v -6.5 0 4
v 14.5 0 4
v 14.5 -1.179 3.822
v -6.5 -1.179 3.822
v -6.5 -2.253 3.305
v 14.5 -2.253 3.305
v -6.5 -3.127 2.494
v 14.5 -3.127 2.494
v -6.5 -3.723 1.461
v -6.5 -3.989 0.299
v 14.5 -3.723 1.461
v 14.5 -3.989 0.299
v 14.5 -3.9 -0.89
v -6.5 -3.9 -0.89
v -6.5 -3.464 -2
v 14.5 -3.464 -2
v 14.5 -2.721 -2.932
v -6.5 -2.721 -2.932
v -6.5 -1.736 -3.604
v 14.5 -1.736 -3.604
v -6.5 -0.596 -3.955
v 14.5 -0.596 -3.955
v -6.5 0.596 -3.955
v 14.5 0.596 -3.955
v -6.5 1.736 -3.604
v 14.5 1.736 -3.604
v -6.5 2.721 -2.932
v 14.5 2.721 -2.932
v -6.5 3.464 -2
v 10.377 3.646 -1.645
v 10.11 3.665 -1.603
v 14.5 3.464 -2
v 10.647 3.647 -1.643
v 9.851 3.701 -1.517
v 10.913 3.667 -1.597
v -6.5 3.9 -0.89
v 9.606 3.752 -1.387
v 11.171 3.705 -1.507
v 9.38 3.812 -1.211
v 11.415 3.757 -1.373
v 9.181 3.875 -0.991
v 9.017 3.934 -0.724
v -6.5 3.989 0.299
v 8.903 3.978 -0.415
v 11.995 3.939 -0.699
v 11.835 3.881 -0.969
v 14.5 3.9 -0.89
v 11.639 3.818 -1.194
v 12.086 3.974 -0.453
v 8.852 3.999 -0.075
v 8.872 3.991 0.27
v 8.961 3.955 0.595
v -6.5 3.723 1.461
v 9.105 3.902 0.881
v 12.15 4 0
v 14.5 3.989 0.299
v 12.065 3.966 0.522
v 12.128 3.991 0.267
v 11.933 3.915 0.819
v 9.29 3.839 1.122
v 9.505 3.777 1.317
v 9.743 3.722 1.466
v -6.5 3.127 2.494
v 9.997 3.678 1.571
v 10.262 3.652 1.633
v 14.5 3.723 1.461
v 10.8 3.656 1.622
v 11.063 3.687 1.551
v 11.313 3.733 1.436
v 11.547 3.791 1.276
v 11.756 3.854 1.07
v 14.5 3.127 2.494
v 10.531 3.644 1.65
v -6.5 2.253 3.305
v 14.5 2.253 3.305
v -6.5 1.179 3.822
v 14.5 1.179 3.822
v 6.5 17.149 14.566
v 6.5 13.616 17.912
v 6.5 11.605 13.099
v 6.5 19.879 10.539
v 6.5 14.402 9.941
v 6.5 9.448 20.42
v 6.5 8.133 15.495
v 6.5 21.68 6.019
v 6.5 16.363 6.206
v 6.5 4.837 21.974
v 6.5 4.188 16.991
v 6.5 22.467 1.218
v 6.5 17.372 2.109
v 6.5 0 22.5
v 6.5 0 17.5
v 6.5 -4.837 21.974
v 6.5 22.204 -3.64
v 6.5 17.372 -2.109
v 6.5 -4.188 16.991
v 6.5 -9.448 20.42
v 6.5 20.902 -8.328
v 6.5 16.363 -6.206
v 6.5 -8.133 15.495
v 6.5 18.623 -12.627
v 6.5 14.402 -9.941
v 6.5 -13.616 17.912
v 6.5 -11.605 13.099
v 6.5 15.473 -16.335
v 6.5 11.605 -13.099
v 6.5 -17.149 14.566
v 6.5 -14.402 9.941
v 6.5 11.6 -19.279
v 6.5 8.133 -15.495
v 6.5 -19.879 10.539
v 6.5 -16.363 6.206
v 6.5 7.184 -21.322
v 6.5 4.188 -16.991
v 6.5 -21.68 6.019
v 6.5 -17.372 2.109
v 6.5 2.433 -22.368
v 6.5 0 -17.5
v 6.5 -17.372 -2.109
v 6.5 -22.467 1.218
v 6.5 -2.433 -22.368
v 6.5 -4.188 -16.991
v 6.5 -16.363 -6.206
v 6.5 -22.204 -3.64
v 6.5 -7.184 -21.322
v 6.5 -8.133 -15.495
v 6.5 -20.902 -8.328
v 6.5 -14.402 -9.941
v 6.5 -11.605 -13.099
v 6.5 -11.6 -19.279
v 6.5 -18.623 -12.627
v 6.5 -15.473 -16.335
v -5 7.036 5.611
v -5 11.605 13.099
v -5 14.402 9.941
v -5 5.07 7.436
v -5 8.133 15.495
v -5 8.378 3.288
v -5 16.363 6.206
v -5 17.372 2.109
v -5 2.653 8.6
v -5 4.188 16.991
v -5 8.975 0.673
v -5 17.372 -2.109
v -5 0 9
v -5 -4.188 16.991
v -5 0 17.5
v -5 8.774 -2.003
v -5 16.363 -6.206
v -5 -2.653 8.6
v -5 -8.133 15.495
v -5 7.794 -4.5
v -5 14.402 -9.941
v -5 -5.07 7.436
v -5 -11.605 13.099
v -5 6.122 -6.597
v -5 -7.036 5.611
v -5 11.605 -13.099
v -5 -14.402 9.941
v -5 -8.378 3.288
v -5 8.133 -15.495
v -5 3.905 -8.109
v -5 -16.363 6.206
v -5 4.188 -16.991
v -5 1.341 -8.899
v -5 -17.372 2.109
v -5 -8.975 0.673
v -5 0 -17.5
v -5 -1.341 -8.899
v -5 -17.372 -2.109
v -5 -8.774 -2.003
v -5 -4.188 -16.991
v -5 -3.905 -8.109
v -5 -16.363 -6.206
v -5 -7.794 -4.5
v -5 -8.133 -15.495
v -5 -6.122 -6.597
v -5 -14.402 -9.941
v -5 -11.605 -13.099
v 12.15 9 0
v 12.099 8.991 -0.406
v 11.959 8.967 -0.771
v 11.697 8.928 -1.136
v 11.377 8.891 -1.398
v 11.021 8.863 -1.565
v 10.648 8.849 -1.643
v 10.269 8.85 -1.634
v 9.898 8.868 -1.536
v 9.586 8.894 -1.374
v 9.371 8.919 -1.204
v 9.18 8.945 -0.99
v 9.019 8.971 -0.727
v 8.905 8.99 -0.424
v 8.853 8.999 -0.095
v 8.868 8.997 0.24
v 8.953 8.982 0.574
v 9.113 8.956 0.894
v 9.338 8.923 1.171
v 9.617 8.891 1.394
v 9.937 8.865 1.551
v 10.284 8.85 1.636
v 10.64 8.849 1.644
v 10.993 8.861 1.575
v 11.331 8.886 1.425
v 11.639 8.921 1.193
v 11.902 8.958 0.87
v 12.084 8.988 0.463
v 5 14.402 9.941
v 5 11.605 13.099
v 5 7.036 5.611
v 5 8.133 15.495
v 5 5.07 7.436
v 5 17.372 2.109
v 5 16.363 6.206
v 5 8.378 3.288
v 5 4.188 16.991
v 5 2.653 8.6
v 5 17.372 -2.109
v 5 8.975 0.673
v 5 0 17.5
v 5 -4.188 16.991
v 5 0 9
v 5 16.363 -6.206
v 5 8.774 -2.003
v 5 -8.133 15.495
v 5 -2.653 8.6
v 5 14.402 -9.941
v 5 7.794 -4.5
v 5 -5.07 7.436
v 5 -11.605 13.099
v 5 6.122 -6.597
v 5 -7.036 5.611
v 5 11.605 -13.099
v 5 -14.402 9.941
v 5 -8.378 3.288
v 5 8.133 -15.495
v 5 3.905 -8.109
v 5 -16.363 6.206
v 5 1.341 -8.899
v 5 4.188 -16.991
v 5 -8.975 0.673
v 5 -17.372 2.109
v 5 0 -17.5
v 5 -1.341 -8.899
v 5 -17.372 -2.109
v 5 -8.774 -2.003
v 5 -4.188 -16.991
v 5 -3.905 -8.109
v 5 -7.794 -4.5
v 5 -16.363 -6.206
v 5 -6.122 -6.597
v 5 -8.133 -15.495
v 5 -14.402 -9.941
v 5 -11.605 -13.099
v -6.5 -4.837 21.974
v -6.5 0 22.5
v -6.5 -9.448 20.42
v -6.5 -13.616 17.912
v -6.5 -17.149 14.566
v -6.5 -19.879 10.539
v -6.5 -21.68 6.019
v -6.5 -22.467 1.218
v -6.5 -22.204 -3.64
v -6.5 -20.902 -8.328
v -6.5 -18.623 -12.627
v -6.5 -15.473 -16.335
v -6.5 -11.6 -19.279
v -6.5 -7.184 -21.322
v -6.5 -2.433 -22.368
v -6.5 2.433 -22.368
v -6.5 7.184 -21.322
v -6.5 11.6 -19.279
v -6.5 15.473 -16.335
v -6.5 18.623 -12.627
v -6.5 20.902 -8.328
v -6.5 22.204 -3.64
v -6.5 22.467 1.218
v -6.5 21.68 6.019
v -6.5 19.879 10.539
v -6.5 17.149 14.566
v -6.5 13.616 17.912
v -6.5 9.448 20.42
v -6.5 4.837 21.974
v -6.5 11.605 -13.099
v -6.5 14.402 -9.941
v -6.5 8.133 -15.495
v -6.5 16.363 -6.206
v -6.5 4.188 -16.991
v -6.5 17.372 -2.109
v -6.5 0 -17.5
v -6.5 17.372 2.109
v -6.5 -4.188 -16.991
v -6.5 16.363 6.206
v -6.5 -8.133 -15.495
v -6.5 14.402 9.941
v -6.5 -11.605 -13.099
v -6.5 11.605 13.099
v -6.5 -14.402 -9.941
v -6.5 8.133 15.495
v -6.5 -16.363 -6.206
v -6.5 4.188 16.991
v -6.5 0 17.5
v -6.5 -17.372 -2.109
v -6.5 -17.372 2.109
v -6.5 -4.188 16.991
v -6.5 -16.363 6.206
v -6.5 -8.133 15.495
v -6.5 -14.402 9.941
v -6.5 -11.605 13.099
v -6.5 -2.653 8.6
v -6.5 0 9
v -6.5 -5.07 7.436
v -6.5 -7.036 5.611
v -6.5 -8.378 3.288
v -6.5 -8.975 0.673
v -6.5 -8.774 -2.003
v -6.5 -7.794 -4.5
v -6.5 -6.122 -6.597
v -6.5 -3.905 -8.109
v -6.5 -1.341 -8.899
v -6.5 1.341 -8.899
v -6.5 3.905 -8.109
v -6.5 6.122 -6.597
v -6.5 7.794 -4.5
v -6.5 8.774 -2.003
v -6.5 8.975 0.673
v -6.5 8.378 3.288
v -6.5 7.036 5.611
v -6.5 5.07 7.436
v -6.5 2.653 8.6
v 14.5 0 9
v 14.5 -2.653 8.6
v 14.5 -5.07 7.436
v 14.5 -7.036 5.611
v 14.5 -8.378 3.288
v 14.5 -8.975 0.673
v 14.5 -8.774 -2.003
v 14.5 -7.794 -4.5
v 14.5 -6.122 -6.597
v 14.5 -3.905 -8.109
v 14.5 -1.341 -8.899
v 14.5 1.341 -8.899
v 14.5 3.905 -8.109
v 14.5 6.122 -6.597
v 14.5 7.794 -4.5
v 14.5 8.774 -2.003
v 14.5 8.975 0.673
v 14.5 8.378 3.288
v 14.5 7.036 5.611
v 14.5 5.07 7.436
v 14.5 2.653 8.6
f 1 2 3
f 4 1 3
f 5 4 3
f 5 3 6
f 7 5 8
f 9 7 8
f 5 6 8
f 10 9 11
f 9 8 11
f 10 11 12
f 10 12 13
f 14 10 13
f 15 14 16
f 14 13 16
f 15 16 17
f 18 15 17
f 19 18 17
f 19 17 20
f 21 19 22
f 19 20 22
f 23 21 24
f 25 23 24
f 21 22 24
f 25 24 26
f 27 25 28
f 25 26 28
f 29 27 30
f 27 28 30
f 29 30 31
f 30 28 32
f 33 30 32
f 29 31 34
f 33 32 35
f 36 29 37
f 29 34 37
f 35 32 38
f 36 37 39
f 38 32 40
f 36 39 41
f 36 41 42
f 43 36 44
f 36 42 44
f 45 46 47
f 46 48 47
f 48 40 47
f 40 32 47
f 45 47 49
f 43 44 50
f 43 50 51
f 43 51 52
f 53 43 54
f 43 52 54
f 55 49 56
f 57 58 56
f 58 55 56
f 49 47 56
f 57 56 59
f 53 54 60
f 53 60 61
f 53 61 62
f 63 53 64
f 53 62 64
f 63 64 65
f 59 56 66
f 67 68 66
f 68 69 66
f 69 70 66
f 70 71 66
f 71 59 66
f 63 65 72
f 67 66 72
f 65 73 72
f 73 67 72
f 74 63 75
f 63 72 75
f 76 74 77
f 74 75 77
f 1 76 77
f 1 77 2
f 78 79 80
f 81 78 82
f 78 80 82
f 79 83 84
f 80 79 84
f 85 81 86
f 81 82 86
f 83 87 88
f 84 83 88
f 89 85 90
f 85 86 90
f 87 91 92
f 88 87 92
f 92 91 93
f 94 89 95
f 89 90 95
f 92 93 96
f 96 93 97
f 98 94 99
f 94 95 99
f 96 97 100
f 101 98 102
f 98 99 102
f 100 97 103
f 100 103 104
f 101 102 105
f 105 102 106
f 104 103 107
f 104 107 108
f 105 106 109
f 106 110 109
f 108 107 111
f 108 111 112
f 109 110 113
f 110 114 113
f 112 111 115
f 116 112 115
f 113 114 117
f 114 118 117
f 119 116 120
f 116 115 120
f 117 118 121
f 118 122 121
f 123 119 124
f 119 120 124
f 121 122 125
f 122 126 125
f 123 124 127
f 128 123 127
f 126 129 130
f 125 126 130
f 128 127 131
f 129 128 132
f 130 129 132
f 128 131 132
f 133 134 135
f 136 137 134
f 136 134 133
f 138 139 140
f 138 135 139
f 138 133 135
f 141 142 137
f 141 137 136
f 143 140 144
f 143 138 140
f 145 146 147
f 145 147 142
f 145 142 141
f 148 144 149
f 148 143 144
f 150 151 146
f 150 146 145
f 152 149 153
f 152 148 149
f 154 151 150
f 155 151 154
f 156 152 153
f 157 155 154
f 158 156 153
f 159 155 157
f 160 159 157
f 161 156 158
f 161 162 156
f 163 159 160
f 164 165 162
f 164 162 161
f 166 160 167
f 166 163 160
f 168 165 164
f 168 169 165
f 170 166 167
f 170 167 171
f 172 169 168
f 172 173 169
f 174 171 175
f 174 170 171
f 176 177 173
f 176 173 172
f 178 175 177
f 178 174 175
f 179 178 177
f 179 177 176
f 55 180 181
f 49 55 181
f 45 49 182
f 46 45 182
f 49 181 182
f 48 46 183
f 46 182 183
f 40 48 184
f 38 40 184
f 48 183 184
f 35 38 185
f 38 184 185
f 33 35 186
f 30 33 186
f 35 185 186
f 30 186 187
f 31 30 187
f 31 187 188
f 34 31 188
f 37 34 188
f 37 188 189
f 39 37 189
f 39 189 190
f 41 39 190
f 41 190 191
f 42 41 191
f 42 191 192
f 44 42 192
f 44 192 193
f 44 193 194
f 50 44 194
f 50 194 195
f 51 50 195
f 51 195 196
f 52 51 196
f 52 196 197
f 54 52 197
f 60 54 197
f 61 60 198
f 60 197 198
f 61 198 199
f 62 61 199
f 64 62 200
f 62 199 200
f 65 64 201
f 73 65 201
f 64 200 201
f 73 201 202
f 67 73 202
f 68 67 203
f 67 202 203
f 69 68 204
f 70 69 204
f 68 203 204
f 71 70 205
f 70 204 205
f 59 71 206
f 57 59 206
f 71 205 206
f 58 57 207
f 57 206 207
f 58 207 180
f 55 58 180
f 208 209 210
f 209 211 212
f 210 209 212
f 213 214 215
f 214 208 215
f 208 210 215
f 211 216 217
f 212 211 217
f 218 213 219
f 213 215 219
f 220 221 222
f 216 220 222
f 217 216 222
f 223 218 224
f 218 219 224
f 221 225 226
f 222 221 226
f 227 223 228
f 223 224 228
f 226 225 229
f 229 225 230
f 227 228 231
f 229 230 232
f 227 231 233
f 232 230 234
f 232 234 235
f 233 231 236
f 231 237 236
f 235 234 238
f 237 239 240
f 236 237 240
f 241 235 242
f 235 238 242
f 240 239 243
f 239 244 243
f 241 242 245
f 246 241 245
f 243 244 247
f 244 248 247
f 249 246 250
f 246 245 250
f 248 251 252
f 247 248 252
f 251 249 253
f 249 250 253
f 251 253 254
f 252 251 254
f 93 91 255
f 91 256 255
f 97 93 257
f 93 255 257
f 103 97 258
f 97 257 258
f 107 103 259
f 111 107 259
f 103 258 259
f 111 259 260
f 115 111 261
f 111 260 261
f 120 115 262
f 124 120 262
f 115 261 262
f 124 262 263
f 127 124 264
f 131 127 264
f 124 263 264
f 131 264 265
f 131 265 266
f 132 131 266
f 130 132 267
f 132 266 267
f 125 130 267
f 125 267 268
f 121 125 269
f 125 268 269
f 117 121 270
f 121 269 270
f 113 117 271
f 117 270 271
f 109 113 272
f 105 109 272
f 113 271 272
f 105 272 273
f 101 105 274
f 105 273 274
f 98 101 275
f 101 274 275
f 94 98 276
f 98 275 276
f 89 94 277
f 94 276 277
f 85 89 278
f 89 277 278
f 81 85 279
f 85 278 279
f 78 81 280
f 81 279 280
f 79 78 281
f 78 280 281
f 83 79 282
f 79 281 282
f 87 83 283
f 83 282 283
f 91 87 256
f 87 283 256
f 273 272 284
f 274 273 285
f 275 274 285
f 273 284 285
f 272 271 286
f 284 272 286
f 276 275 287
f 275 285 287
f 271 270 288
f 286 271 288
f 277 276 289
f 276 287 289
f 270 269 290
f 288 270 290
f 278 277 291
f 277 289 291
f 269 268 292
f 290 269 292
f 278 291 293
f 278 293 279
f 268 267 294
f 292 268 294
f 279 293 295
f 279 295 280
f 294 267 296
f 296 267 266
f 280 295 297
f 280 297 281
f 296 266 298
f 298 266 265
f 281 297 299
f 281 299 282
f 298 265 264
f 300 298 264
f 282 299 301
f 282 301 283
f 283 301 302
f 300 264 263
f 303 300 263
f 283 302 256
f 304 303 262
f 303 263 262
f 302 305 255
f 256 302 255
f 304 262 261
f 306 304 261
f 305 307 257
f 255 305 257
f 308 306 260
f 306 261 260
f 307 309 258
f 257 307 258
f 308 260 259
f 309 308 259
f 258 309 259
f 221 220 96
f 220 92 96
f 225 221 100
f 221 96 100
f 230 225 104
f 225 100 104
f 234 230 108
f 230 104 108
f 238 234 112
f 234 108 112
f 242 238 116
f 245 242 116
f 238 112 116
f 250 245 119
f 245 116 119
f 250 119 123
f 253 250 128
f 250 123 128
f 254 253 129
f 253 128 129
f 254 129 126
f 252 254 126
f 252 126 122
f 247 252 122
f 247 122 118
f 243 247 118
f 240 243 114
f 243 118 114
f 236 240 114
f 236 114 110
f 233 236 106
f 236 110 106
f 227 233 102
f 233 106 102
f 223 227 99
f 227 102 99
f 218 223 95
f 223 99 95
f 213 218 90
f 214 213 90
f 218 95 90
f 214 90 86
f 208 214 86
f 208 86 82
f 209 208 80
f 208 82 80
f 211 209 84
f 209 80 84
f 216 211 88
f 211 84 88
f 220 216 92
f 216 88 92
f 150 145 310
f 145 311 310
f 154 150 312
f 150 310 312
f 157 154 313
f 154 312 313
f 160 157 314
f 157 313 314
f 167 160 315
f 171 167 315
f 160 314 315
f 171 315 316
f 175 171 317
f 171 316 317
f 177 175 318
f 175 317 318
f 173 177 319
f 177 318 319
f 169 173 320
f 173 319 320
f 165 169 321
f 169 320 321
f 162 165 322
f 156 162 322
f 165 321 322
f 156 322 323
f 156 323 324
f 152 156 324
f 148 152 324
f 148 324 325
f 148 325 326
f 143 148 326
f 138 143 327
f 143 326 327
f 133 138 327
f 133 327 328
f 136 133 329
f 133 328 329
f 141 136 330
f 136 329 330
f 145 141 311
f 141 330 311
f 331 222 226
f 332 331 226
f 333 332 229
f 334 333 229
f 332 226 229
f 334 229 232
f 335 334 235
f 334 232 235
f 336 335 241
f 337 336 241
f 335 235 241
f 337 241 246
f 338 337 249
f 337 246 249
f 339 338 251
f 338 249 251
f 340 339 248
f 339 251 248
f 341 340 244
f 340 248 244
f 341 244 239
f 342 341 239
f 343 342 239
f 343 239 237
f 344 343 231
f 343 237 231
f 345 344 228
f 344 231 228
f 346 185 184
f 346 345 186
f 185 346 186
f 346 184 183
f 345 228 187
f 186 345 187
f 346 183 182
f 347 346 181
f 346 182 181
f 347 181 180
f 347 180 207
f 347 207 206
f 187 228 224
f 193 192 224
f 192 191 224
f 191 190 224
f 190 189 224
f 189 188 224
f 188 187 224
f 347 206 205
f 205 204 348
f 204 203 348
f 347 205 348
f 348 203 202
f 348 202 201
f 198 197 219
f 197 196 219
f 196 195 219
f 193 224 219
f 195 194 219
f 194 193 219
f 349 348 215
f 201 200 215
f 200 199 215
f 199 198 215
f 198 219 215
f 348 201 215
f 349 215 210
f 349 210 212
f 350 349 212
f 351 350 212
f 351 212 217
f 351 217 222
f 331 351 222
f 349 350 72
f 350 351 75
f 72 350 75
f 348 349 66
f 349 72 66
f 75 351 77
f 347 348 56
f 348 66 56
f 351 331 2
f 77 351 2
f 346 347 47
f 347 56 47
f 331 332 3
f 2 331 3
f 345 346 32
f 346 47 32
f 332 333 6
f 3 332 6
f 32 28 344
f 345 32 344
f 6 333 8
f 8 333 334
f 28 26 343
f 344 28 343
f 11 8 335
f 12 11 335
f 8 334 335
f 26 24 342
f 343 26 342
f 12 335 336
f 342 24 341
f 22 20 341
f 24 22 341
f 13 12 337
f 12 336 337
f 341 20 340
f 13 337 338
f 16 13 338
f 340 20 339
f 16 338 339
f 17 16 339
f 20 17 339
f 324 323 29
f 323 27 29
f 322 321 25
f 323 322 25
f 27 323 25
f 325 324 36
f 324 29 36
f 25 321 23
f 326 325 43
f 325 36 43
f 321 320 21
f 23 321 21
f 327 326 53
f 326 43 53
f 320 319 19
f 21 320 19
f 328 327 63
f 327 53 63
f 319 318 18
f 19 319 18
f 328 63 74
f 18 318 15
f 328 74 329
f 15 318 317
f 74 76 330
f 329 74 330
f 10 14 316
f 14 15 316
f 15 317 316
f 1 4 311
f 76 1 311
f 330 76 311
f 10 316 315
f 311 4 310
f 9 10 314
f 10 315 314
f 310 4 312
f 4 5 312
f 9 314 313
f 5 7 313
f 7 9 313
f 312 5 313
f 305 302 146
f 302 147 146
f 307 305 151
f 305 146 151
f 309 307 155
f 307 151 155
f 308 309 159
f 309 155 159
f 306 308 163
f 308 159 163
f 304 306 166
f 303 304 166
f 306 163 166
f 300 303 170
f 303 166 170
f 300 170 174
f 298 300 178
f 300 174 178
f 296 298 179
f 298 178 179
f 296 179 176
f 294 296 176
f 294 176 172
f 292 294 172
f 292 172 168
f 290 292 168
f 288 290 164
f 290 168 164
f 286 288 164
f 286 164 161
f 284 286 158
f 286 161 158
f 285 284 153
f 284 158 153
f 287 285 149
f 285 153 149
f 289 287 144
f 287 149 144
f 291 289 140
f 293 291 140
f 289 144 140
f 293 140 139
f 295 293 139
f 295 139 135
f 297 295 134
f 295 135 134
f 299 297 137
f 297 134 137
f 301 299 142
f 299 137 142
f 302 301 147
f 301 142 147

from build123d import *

# Parameters (mm, degrees)
SKETCH1_W              = 8
SKETCH1_H              = 5
SKETCH1_W_2            = 10
SKETCH1_H_2            = 8.5
M4_TAPPED_HOLE1_REACH  = 43.337
M4_TAPPED_HOLE1_BORE_R = 1.65


with BuildPart() as part:
    # Sketch1 → Revolve1 (revolve)
    with BuildSketch(Plane.XY, mode=Mode.PRIVATE) as revolve1_sk:
        Polygon((-6.5, 9), (-6.5, 4), (6.5, 4), (6.5, 9), (5, 9), (-5, 9), align=None)
        with Locations((10.5, 6.5)):
            Rectangle(SKETCH1_W, SKETCH1_H)
        with Locations((0, 13.25)):
            Rectangle(SKETCH1_W_2, SKETCH1_H_2)
        Polygon((-6.5, 17.5), (-5, 17.5), (5, 17.5), (6.5, 17.5), (6.5, 22.5), (-6.5, 22.5), align=None)
    revolve(revolve1_sk.sketch.rotate(Axis((0, 0, 0), (1, 0, 0)), 90), axis=Axis((0, 0, 0), (1, 0, 0)))

    # M4 Tapped Hole1 bore → M4 Tapped Hole1 (cut, up to next)
    with BuildSketch(Plane(origin=(0, 9, 0), x_dir=(1, 0, 0), z_dir=(0, 1, 0)), mode=Mode.PRIVATE) as m4_tapped_hole1_sk1:
        with Locations((10.5, 0)):
            Circle(M4_TAPPED_HOLE1_BORE_R)
    m4_tapped_hole1_tool1 = extrude(m4_tapped_hole1_sk1.sketch, amount=-M4_TAPPED_HOLE1_REACH, mode=Mode.PRIVATE) & part.part
    add(m4_tapped_hole1_tool1.solids().sort_by_distance((10.5, 9, 0))[0], mode=Mode.SUBTRACT)


solid = part.part
